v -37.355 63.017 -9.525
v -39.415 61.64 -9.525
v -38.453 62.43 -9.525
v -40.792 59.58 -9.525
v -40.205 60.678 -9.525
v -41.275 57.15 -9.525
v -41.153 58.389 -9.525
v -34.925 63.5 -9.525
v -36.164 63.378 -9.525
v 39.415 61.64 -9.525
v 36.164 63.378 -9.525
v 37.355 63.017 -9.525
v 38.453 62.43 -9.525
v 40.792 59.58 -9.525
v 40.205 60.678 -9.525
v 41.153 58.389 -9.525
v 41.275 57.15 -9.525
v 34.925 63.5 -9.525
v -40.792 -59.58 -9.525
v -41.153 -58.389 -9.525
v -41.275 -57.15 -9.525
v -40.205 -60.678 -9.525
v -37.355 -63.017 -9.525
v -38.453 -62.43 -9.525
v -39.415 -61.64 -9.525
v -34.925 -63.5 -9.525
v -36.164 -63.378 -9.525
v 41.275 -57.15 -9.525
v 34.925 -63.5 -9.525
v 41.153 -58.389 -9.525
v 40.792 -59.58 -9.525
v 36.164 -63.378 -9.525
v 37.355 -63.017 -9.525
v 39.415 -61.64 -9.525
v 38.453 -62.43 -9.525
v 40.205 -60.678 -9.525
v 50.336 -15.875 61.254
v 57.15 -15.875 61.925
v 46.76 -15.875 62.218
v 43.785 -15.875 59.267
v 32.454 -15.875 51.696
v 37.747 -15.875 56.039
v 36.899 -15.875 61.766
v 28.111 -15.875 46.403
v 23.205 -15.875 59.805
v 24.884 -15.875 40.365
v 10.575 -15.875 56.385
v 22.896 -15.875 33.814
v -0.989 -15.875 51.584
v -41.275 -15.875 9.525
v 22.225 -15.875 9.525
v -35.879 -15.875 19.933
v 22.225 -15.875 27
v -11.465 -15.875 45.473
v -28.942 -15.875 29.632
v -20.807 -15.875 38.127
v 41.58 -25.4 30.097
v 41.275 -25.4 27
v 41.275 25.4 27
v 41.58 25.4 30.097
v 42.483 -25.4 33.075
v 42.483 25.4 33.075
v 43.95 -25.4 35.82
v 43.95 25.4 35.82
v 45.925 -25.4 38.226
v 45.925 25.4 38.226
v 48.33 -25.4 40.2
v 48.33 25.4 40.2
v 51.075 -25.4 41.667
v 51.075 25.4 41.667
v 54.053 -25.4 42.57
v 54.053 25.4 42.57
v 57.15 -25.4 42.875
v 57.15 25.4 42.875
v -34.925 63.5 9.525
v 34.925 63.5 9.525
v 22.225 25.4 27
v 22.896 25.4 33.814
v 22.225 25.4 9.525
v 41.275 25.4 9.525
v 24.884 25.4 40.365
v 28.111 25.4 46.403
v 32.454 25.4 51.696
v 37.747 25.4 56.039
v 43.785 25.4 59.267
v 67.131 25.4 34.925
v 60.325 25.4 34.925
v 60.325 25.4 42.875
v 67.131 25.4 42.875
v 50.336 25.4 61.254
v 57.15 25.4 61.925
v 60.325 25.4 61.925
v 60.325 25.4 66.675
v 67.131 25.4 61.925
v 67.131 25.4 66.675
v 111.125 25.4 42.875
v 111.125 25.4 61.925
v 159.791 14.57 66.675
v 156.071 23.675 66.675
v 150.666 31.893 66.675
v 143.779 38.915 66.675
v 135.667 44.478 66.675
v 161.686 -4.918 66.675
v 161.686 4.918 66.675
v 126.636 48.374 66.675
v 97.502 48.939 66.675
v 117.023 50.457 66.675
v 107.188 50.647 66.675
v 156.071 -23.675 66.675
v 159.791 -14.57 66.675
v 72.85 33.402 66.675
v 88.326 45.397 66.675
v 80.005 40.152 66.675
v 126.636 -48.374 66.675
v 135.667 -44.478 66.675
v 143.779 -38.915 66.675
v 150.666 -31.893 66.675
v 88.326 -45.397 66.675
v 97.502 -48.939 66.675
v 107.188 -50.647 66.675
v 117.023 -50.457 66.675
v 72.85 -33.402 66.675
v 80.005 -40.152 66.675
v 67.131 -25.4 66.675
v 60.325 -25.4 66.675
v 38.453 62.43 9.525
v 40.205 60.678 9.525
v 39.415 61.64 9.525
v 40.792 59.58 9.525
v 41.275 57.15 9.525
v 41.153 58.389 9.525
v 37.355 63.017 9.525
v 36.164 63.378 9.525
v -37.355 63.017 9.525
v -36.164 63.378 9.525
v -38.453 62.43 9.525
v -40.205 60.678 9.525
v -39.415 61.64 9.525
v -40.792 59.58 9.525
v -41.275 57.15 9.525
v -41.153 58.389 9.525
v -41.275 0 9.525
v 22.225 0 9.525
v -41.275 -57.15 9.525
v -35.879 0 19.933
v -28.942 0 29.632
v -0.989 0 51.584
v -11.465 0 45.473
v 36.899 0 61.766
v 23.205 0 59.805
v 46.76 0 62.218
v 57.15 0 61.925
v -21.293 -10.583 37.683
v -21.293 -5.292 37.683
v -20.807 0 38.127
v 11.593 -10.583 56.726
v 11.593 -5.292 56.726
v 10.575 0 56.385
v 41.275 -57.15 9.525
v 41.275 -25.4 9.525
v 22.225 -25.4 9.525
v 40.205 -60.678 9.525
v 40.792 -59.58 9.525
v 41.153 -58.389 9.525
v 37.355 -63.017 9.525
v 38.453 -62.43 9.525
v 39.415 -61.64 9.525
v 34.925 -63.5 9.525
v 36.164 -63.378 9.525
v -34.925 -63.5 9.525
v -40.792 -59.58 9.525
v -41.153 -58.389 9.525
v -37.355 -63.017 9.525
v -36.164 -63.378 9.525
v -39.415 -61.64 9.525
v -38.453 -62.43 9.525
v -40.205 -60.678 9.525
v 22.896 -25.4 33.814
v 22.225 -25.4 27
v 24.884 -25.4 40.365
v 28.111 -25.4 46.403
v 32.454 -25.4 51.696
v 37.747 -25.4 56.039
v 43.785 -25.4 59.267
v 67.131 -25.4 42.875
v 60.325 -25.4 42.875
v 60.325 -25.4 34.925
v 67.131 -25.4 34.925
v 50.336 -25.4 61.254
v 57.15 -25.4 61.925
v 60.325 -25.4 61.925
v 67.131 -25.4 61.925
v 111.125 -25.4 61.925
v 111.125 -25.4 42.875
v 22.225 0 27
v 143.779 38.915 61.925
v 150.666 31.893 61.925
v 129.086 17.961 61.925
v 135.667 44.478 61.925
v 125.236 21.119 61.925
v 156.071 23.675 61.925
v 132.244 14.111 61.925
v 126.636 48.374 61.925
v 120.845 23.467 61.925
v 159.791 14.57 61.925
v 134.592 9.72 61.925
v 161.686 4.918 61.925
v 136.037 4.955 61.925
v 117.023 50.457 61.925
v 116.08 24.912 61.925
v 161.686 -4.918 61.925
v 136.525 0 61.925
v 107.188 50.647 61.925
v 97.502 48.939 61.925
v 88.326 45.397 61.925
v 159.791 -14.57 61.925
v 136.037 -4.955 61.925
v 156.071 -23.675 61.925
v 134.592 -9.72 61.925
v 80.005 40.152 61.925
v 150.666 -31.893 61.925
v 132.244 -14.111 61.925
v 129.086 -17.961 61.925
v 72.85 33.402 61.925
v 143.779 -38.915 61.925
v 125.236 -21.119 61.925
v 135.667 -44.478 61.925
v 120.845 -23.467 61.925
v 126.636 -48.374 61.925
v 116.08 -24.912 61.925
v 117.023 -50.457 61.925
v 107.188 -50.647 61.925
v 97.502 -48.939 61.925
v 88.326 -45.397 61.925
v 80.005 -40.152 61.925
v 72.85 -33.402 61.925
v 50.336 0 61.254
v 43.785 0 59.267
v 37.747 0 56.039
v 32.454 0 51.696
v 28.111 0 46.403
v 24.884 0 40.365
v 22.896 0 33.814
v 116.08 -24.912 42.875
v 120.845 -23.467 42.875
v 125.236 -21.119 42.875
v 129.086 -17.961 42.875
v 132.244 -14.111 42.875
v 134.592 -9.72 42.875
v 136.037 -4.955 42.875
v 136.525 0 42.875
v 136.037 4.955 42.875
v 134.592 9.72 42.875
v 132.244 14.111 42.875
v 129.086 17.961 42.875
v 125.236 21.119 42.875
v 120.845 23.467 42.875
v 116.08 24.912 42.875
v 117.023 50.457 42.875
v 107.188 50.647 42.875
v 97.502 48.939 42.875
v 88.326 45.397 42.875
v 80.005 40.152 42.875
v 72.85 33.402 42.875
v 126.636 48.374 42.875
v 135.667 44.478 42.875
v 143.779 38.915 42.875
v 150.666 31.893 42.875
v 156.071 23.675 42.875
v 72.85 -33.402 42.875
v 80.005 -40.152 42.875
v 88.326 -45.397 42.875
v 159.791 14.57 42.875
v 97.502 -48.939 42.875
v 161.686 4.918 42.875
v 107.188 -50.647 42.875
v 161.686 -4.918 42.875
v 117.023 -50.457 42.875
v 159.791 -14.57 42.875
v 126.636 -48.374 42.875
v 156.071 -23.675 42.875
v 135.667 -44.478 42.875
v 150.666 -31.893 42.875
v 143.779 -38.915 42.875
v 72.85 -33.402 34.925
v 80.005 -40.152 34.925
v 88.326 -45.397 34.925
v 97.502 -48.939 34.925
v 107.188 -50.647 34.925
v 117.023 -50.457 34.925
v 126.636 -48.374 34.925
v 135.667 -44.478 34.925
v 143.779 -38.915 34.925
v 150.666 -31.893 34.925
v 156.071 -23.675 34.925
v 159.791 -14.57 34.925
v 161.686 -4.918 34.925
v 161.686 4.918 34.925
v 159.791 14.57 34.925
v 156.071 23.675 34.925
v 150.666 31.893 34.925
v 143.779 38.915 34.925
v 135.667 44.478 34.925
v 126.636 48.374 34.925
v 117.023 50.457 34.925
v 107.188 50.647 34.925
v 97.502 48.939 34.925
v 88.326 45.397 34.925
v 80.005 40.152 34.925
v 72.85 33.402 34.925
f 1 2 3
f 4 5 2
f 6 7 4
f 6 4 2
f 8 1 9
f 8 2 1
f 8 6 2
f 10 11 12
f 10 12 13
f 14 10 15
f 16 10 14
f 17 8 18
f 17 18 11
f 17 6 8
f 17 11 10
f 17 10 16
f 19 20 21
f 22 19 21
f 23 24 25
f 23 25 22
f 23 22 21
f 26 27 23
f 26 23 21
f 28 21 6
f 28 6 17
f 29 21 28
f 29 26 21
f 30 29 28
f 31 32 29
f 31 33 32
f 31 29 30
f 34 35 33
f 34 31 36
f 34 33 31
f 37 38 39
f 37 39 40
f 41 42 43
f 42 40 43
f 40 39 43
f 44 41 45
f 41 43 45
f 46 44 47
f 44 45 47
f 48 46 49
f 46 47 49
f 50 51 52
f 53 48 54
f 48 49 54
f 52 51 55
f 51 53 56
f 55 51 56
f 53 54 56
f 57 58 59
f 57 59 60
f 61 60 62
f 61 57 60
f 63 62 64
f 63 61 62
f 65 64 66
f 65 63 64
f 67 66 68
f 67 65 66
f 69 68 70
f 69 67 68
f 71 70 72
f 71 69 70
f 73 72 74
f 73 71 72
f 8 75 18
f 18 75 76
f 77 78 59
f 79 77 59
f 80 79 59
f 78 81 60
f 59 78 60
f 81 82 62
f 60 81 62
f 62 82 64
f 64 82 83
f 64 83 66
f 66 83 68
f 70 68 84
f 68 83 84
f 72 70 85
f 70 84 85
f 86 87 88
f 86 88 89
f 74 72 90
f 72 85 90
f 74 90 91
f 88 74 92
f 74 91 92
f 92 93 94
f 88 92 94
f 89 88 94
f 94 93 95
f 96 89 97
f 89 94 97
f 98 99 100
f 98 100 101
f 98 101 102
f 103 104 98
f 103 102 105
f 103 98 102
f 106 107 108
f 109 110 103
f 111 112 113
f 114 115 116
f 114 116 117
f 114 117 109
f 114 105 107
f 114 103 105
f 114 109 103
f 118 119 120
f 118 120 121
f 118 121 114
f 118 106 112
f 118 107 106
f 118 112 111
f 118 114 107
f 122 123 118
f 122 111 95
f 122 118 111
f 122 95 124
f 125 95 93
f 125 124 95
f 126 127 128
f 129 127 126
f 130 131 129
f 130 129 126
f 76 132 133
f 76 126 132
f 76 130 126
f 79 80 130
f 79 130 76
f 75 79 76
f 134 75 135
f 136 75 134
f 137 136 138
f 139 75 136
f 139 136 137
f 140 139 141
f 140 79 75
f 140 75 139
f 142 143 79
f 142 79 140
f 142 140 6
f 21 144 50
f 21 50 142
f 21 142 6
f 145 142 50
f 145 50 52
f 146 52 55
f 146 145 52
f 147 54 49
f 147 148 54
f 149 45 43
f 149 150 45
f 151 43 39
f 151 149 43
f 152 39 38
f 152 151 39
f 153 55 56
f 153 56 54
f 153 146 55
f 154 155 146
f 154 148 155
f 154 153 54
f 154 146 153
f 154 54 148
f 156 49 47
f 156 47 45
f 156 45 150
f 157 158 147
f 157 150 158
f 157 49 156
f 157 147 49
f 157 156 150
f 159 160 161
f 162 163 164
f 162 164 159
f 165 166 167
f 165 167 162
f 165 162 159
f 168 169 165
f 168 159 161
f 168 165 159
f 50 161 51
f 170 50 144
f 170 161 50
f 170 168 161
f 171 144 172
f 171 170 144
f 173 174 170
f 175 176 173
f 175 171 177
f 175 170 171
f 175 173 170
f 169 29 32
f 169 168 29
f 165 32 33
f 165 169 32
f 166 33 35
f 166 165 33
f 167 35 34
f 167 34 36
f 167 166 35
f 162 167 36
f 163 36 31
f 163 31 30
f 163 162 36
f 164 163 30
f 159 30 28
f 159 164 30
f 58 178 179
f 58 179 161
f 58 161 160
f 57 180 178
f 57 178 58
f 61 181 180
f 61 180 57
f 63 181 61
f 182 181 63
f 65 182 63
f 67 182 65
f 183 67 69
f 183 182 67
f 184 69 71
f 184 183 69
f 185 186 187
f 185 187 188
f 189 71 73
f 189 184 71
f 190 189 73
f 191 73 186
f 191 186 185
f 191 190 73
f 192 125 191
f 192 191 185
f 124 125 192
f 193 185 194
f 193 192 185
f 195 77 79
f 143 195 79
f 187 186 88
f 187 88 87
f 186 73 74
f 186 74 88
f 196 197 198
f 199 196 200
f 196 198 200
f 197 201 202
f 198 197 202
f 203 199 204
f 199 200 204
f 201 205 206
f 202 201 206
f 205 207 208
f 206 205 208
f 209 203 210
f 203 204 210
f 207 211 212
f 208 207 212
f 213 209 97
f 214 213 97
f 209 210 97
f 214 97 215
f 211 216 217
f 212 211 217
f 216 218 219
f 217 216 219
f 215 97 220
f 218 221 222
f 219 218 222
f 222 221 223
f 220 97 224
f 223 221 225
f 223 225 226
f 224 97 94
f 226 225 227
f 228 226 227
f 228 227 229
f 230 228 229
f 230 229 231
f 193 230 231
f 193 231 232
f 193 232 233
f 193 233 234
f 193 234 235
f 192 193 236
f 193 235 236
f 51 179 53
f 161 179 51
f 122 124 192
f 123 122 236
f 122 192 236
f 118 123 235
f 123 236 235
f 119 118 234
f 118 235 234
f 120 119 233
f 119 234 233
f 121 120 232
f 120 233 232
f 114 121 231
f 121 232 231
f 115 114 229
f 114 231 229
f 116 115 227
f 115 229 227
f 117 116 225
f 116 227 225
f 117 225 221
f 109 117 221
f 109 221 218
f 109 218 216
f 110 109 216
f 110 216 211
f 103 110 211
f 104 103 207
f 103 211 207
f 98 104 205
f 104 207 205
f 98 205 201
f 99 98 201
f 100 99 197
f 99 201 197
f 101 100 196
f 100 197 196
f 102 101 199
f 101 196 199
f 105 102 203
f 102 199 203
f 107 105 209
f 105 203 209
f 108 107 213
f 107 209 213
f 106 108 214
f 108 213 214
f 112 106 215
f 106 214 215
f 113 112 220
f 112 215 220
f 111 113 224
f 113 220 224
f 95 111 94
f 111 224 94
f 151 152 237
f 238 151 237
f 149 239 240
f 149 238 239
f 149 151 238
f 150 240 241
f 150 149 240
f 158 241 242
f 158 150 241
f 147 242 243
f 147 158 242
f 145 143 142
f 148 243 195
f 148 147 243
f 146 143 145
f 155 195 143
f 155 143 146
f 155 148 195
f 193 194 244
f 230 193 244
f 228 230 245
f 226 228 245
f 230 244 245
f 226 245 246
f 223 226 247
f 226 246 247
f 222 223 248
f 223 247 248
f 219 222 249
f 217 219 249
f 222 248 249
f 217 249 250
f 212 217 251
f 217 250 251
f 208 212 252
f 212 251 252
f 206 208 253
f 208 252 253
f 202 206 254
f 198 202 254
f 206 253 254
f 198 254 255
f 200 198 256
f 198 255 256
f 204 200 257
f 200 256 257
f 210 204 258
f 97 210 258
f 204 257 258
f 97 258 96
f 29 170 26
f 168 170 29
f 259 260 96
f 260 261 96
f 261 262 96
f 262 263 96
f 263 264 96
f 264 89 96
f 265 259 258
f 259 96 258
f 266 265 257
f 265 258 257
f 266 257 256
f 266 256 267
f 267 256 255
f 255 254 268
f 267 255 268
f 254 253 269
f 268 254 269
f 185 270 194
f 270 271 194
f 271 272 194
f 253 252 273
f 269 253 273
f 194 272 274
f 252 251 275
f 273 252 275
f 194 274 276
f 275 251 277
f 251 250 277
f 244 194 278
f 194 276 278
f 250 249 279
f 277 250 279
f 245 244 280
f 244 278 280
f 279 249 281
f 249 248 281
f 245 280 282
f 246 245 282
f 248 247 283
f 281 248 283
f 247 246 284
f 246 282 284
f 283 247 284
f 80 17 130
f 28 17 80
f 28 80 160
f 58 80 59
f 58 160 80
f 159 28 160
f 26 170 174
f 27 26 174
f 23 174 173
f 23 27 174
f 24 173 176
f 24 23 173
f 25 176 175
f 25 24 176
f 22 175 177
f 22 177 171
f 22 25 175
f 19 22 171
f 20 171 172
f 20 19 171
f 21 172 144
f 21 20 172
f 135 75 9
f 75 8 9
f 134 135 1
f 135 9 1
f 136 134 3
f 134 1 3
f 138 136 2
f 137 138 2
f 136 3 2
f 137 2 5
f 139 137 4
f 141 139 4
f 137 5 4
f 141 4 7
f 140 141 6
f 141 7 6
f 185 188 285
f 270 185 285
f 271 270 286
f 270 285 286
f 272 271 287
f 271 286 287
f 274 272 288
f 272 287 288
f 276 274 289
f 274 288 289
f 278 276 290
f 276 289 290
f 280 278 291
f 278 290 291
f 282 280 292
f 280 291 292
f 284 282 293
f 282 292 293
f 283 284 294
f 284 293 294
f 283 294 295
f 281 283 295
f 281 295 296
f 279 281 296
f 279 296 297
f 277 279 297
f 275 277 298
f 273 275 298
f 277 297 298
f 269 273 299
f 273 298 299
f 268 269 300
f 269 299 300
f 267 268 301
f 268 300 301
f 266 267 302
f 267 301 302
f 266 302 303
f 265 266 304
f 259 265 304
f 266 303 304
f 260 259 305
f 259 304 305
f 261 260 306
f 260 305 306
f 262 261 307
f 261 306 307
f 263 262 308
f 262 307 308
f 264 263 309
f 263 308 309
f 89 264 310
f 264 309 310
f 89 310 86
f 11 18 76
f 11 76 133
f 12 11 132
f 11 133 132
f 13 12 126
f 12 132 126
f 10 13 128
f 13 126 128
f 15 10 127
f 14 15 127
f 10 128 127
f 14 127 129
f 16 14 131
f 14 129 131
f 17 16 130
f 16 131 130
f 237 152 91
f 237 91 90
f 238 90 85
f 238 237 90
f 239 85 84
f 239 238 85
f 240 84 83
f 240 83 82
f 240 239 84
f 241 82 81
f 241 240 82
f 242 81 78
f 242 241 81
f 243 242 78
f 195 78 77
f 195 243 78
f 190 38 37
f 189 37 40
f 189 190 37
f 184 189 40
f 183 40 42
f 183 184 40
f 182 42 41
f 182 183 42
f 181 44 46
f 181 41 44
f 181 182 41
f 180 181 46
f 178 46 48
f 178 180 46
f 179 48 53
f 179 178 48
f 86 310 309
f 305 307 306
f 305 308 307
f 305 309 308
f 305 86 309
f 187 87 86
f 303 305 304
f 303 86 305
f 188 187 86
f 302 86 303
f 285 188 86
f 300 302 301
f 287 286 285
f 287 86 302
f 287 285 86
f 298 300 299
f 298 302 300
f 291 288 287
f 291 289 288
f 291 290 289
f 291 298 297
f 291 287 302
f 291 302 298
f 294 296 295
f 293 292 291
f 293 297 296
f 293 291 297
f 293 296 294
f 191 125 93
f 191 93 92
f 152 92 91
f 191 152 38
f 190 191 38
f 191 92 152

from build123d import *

# Parameters (mm, degrees)
F1_DEPTH = 63.5
F0_W     = 25.4
F0_H     = 19.05
F2_DEPTH = 25.4
F3_DEPTH = 15.875
F5_R     = 6.35


with BuildPart() as f1:
    # F0 (on Front) → F1 (new body, symmetric)
    with BuildSketch(Plane.XZ):
        Polygon((-41.275, 9.525), (-41.275, -9.525), (41.275, -9.525), (41.275, 9.525), (22.225, 9.525), align=None)
    extrude(amount=F1_DEPTH, both=True)

    # F0 (on Front) → F2 (join, symmetric)
    with BuildSketch(Plane.XZ):
        Polygon((60.325, 66.675), (60.325, 61.9252), (85.725, 61.9252), (85.725, 42.8752), (60.325, 42.8752), (60.325, 34.925), (111.125, 34.925), (111.125, 66.675), align=None)
        with BuildLine():
            Line((22.225, 9.525), (41.275, 9.525))
            Line((41.275, 9.525), (41.275, 27.0002))
            ThreePointArc((41.275, 27.0002), (45.92468, 38.22552), (57.15, 42.8752))
            Line((57.15, 42.8752), (60.325, 42.8752))
            Line((60.325, 42.8752), (60.325, 61.9252))
            Line((60.325, 61.9252), (57.15, 61.9252))
            ThreePointArc((57.15, 61.9252), (32.454296, 51.695904), (22.225, 27.0002))
            Line((22.225, 27.0002), (22.225, 9.525))
        make_face()
        with Locations((73.025, 52.4002)):
            Rectangle(F0_W, F0_H)
    extrude(amount=F2_DEPTH, both=True)

    # F0 (on Front) → F3 (join)
    with BuildSketch(Plane.XZ):
        with BuildLine():
            add(Edge.make_bspline(
                [(-41.275, 9.525), (-27.823856, 40.664345), (5.336885, 65.223247), (57.15, 61.9252)],
                knots=[0, 0, 0, 0, 111.504536, 111.504536, 111.504536, 111.504536], degree=3))
            Line((-41.275, 9.525), (22.225, 9.525))
            Line((22.225, 9.525), (22.225, 27.0002))
            ThreePointArc((22.225, 27.0002), (32.454296, 51.695904), (57.15, 61.9252))
        make_face()
    extrude(amount=F3_DEPTH)

    # F0 (on Front) → F4 (revolve)
    with BuildSketch(Plane.XZ):
        Polygon((60.325, 66.675), (60.325, 61.9252), (85.725, 61.9252), (85.725, 42.8752), (60.325, 42.8752), (60.325, 34.925), (111.125, 34.925), (111.125, 66.675), align=None)
    revolve(axis=Axis((111.125, 0, 50.8), (0, 0, 1)))

    # F5
    f5_edges = [f1.edges().sort_by_distance(p)[0] for p in [
        (-41.275, -63.5, 0),
        (41.275, -63.5, 0),
        (41.275, 63.5, 0),
        (-41.275, 63.5, 0),
    ]]
    fillet(f5_edges, radius=F5_R)


solid = f1.part
